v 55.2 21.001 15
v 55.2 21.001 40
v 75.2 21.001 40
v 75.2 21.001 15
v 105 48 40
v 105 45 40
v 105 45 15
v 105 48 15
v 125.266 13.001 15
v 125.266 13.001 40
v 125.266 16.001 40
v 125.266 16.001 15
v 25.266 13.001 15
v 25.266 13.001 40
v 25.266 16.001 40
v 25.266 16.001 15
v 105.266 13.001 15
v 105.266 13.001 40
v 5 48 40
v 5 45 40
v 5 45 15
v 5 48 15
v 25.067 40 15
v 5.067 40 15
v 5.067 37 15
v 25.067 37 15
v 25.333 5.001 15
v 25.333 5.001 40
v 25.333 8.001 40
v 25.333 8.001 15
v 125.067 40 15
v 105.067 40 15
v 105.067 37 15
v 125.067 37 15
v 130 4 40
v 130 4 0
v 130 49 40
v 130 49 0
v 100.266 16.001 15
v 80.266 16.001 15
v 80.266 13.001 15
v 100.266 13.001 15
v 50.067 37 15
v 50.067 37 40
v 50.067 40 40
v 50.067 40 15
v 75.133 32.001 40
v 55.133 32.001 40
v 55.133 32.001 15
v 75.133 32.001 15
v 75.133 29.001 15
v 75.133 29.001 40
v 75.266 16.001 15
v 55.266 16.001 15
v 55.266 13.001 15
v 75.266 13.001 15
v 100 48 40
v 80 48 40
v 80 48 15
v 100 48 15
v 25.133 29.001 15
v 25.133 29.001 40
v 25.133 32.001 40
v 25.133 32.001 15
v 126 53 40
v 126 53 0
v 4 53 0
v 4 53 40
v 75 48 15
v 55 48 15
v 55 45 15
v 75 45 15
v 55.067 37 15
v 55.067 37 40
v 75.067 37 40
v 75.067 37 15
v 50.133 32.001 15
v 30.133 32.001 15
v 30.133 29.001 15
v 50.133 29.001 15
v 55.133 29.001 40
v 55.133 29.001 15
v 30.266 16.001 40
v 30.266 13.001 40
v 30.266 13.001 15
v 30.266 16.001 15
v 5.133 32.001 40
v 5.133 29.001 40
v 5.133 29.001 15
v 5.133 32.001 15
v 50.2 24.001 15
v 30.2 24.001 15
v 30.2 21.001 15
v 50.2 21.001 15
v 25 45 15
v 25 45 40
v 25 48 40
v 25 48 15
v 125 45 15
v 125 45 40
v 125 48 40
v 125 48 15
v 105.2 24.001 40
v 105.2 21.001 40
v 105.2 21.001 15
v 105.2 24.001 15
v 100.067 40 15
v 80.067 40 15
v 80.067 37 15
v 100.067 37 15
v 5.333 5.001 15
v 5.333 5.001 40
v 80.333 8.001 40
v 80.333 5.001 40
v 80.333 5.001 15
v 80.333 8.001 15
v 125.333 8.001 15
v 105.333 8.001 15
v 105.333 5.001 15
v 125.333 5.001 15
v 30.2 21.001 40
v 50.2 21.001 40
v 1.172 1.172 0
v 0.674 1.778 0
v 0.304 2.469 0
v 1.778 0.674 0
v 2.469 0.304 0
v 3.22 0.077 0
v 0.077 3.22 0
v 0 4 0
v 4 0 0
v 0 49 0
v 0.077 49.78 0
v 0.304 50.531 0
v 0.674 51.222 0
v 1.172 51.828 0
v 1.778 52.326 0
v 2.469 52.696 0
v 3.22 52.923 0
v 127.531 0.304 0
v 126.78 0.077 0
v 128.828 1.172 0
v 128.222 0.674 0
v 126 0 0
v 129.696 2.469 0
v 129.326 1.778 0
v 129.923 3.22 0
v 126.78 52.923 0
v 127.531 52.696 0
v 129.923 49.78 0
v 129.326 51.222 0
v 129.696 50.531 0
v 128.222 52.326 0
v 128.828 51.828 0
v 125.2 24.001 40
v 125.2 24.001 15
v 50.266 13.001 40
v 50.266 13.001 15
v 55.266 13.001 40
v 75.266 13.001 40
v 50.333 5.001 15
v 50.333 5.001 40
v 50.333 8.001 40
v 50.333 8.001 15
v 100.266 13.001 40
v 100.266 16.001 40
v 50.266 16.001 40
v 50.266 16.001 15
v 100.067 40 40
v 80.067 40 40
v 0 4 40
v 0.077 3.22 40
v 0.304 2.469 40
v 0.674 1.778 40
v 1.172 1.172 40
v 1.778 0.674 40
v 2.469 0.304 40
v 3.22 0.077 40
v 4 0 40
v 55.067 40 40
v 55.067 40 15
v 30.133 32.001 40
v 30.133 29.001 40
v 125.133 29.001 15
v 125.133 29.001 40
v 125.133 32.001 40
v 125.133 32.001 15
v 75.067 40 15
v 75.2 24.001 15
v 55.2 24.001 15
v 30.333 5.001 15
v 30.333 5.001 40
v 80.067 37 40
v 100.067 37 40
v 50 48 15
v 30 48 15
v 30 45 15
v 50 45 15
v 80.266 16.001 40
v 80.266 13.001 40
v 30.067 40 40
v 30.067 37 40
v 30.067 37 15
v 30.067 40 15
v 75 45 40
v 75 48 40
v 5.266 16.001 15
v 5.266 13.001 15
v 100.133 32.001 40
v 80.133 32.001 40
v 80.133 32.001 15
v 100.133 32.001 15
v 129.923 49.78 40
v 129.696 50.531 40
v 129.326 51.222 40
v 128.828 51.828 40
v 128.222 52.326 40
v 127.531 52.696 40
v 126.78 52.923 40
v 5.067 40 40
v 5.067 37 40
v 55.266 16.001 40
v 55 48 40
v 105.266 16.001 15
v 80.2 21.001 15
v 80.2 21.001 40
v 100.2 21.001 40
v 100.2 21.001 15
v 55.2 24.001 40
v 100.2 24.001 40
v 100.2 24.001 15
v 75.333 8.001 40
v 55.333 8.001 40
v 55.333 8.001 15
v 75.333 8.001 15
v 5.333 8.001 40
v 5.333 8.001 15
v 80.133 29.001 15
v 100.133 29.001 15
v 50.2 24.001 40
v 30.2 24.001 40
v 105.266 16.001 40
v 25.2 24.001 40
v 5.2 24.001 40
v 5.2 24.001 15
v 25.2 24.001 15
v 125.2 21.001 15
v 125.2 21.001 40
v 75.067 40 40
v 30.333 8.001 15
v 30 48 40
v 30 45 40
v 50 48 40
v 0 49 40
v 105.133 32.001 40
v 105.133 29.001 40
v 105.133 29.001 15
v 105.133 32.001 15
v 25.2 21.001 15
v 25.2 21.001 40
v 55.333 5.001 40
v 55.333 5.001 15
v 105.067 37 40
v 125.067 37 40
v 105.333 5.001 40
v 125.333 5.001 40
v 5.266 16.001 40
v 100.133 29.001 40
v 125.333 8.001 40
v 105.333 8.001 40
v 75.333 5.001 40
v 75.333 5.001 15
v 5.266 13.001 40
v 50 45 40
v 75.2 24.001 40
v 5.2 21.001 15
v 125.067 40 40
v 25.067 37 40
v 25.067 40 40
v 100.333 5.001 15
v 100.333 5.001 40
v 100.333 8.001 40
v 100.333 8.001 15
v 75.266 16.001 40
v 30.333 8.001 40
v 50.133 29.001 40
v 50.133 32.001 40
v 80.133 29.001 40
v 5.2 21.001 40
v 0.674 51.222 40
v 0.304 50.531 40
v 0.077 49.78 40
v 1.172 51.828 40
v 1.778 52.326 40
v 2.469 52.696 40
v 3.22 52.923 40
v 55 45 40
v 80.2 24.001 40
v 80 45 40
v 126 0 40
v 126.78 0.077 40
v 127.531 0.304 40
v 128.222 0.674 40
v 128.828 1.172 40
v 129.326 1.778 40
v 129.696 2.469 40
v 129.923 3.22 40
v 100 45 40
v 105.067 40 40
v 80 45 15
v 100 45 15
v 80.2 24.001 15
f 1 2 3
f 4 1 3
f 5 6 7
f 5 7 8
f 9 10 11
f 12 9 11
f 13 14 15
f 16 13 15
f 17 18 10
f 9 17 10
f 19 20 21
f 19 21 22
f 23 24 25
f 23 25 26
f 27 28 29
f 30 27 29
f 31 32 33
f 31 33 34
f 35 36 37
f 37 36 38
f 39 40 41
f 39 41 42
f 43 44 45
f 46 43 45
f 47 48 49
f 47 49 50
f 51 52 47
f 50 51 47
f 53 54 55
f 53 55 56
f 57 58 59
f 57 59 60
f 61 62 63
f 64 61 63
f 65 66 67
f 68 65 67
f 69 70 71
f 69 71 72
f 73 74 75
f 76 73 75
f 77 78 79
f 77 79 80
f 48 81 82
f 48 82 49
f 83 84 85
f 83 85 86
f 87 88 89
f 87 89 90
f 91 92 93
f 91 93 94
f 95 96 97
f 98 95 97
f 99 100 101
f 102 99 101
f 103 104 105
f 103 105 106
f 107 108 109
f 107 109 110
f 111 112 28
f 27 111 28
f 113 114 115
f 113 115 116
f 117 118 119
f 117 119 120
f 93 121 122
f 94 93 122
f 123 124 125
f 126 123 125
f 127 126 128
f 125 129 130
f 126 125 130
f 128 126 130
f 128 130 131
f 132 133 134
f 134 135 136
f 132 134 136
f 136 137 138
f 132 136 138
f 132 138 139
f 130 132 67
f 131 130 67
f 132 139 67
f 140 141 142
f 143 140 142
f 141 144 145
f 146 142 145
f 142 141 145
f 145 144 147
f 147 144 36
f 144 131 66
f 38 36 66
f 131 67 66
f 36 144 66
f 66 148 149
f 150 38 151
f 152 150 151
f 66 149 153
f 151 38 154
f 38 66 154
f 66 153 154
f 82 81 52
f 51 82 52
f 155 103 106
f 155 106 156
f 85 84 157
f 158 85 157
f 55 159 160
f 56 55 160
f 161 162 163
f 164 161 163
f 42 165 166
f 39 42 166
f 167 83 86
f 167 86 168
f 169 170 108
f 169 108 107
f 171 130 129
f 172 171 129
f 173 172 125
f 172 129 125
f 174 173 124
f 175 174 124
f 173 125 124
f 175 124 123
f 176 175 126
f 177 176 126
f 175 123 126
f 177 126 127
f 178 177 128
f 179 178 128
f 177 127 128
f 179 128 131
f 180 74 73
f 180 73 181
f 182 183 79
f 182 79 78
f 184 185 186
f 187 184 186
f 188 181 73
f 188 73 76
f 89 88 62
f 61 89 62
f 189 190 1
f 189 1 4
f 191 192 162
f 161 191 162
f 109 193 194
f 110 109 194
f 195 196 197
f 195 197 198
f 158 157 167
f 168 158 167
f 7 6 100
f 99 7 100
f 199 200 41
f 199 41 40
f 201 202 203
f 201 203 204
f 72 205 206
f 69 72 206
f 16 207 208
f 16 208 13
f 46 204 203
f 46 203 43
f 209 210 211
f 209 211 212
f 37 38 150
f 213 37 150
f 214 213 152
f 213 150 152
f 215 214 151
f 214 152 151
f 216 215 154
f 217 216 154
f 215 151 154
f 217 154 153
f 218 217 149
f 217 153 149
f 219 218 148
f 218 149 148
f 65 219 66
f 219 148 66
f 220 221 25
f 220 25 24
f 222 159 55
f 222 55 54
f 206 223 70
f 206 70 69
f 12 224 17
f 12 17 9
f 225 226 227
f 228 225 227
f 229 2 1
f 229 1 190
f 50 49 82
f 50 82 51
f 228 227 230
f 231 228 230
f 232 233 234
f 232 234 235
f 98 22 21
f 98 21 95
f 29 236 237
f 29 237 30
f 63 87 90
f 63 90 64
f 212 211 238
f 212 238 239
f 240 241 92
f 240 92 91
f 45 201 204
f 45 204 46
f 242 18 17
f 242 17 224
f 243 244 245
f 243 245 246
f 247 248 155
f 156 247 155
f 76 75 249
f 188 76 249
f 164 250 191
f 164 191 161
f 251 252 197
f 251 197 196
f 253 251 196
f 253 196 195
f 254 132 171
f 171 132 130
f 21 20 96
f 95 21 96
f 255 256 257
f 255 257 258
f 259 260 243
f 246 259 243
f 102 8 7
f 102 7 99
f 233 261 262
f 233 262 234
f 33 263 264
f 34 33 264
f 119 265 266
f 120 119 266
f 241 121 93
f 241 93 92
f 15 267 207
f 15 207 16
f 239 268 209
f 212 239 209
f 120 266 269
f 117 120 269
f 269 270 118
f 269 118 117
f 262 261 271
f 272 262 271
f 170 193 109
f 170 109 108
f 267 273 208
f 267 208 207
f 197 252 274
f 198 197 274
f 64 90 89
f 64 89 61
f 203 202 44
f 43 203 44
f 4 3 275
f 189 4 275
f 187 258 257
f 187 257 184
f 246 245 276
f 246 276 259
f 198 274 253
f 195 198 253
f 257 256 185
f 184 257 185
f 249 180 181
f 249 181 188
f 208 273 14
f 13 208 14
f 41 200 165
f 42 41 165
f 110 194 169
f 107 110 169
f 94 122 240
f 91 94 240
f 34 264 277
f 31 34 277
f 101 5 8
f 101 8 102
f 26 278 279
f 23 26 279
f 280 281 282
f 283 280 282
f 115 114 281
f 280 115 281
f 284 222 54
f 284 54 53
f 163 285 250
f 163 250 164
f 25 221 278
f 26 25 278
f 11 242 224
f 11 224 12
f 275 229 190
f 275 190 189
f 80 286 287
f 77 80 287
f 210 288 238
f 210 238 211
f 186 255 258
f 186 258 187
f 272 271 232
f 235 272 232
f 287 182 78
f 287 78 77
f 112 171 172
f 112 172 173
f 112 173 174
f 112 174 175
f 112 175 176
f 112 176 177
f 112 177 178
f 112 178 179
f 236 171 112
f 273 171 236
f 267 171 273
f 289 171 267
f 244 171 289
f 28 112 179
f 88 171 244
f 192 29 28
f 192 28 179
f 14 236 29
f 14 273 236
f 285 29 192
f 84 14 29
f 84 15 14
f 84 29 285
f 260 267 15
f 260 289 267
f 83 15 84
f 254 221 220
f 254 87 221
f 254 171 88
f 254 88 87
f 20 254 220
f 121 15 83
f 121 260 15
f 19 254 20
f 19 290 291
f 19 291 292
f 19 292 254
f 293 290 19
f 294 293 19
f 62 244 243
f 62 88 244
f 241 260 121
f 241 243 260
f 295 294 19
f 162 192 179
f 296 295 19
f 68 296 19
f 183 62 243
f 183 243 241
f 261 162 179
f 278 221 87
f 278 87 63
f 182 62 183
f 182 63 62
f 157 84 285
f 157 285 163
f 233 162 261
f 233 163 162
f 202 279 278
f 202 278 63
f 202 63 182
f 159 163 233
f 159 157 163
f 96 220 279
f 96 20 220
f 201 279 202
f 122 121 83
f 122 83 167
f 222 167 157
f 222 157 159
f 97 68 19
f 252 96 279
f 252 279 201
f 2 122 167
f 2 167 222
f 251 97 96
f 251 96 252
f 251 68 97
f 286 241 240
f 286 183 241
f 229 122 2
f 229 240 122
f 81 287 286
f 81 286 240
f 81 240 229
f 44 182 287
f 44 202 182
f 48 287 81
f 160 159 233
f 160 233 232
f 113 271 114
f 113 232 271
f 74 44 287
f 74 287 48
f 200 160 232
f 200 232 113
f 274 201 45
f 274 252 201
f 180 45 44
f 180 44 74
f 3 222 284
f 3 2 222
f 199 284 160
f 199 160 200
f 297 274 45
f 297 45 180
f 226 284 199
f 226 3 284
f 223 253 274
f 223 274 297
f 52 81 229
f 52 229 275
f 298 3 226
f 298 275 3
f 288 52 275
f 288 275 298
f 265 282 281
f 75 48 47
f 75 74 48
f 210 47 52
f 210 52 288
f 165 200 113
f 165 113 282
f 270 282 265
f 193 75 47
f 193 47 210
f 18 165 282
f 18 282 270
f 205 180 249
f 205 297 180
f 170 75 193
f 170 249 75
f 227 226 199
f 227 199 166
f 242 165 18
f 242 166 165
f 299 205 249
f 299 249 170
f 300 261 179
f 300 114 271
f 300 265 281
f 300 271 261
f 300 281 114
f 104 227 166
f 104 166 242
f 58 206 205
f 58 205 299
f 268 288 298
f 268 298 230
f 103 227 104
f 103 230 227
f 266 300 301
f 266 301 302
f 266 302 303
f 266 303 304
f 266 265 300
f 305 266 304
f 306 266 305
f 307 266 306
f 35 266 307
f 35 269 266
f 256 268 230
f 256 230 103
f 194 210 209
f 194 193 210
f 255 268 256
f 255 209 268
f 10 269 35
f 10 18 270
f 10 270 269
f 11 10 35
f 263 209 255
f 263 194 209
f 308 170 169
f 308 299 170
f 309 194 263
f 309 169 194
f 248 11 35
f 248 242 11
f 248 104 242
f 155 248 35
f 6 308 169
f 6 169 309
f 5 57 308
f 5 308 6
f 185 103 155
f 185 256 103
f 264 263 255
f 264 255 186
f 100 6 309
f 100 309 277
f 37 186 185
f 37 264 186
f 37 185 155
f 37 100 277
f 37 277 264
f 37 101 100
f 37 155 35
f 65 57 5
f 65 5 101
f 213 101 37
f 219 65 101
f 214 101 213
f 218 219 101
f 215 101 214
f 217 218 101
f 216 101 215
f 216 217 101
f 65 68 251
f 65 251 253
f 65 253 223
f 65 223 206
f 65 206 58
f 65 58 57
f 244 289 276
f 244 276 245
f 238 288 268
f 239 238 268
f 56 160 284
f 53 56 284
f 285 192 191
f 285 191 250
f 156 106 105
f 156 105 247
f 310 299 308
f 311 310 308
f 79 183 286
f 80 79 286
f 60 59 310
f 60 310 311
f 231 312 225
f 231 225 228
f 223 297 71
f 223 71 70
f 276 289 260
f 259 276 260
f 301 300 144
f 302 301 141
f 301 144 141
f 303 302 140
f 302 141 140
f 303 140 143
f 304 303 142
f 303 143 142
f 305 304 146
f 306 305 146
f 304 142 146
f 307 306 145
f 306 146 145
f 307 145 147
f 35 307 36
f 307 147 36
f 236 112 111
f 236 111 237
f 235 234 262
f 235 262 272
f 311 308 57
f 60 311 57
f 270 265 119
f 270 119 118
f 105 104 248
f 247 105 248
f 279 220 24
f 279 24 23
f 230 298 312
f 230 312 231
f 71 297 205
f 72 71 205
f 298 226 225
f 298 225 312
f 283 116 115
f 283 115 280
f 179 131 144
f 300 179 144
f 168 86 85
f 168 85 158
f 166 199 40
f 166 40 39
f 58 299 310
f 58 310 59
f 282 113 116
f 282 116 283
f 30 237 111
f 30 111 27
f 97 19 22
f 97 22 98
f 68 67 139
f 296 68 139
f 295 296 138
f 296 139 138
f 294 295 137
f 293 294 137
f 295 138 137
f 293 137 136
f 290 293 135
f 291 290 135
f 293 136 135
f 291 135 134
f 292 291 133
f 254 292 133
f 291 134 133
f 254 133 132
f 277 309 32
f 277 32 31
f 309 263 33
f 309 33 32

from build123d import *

# Parameters (mm, degrees)
F1_DEPTH = 40
F2_W     = 20
F2_H     = 3
F3_DEPTH = 25


with BuildPart() as f1:
    # F0 (on Top) → F1 (new body)
    with BuildSketch(Plane.XY):
        with BuildLine():
            ThreePointArc((0, 4), (1.171573, 1.171573), (4, 0))
            Line((4, 0), (126, 0))
            ThreePointArc((126, 0), (128.828427, 1.171573), (130, 4))
            Line((130, 4), (130, 49))
            ThreePointArc((130, 49), (128.828427, 51.828427), (126, 53))
            Line((126, 53), (4, 53))
            ThreePointArc((4, 53), (1.171573, 51.828427), (0, 49))
            Line((0, 49), (0, 4))
        make_face()
    extrude(amount=F1_DEPTH)

    # F2 (on face) → F3 (cut)
    with BuildSketch(Plane.XY.offset(40)):
        with Locations((15, 46.5)):
            Rectangle(F2_W, F2_H)
        with Locations((15.066508, 38.500276)):
            Rectangle(F2_W, F2_H)
        with Locations((15.133017, 30.500553)):
            Rectangle(F2_W, F2_H)
        with Locations((15.199525, 22.500829)):
            Rectangle(F2_W, F2_H)
        with Locations((15.266034, 14.501106)):
            Rectangle(F2_W, F2_H)
        with Locations((15.332542, 6.501382)):
            Rectangle(F2_W, F2_H)
        with Locations((40, 46.5)):
            Rectangle(F2_W, F2_H)
        with Locations((40.066508, 38.500276)):
            Rectangle(F2_W, F2_H)
        with Locations((40.133017, 30.500553)):
            Rectangle(F2_W, F2_H)
        with Locations((40.199525, 22.500829)):
            Rectangle(F2_W, F2_H)
        with Locations((40.266034, 14.501106)):
            Rectangle(F2_W, F2_H)
        with Locations((40.332542, 6.501382)):
            Rectangle(F2_W, F2_H)
        with Locations((65, 46.5)):
            Rectangle(F2_W, F2_H)
        with Locations((65.066508, 38.500276)):
            Rectangle(F2_W, F2_H)
        with Locations((65.133017, 30.500553)):
            Rectangle(F2_W, F2_H)
        with Locations((65.199525, 22.500829)):
            Rectangle(F2_W, F2_H)
        with Locations((65.266034, 14.501106)):
            Rectangle(F2_W, F2_H)
        with Locations((65.332542, 6.501382)):
            Rectangle(F2_W, F2_H)
        with Locations((90, 46.5)):
            Rectangle(F2_W, F2_H)
        with Locations((90.066508, 38.500276)):
            Rectangle(F2_W, F2_H)
        with Locations((90.133017, 30.500553)):
            Rectangle(F2_W, F2_H)
        with Locations((90.199525, 22.500829)):
            Rectangle(F2_W, F2_H)
        with Locations((90.266034, 14.501106)):
            Rectangle(F2_W, F2_H)
        with Locations((90.332542, 6.501382)):
            Rectangle(F2_W, F2_H)
        with Locations((115, 46.5)):
            Rectangle(F2_W, F2_H)
        with Locations((115.066508, 38.500276)):
            Rectangle(F2_W, F2_H)
        with Locations((115.133017, 30.500553)):
            Rectangle(F2_W, F2_H)
        with Locations((115.199525, 22.500829)):
            Rectangle(F2_W, F2_H)
        with Locations((115.266034, 14.501106)):
            Rectangle(F2_W, F2_H)
        with Locations((115.332542, 6.501382)):
            Rectangle(F2_W, F2_H)
    extrude(amount=-F3_DEPTH, mode=Mode.SUBTRACT)


solid = f1.part
